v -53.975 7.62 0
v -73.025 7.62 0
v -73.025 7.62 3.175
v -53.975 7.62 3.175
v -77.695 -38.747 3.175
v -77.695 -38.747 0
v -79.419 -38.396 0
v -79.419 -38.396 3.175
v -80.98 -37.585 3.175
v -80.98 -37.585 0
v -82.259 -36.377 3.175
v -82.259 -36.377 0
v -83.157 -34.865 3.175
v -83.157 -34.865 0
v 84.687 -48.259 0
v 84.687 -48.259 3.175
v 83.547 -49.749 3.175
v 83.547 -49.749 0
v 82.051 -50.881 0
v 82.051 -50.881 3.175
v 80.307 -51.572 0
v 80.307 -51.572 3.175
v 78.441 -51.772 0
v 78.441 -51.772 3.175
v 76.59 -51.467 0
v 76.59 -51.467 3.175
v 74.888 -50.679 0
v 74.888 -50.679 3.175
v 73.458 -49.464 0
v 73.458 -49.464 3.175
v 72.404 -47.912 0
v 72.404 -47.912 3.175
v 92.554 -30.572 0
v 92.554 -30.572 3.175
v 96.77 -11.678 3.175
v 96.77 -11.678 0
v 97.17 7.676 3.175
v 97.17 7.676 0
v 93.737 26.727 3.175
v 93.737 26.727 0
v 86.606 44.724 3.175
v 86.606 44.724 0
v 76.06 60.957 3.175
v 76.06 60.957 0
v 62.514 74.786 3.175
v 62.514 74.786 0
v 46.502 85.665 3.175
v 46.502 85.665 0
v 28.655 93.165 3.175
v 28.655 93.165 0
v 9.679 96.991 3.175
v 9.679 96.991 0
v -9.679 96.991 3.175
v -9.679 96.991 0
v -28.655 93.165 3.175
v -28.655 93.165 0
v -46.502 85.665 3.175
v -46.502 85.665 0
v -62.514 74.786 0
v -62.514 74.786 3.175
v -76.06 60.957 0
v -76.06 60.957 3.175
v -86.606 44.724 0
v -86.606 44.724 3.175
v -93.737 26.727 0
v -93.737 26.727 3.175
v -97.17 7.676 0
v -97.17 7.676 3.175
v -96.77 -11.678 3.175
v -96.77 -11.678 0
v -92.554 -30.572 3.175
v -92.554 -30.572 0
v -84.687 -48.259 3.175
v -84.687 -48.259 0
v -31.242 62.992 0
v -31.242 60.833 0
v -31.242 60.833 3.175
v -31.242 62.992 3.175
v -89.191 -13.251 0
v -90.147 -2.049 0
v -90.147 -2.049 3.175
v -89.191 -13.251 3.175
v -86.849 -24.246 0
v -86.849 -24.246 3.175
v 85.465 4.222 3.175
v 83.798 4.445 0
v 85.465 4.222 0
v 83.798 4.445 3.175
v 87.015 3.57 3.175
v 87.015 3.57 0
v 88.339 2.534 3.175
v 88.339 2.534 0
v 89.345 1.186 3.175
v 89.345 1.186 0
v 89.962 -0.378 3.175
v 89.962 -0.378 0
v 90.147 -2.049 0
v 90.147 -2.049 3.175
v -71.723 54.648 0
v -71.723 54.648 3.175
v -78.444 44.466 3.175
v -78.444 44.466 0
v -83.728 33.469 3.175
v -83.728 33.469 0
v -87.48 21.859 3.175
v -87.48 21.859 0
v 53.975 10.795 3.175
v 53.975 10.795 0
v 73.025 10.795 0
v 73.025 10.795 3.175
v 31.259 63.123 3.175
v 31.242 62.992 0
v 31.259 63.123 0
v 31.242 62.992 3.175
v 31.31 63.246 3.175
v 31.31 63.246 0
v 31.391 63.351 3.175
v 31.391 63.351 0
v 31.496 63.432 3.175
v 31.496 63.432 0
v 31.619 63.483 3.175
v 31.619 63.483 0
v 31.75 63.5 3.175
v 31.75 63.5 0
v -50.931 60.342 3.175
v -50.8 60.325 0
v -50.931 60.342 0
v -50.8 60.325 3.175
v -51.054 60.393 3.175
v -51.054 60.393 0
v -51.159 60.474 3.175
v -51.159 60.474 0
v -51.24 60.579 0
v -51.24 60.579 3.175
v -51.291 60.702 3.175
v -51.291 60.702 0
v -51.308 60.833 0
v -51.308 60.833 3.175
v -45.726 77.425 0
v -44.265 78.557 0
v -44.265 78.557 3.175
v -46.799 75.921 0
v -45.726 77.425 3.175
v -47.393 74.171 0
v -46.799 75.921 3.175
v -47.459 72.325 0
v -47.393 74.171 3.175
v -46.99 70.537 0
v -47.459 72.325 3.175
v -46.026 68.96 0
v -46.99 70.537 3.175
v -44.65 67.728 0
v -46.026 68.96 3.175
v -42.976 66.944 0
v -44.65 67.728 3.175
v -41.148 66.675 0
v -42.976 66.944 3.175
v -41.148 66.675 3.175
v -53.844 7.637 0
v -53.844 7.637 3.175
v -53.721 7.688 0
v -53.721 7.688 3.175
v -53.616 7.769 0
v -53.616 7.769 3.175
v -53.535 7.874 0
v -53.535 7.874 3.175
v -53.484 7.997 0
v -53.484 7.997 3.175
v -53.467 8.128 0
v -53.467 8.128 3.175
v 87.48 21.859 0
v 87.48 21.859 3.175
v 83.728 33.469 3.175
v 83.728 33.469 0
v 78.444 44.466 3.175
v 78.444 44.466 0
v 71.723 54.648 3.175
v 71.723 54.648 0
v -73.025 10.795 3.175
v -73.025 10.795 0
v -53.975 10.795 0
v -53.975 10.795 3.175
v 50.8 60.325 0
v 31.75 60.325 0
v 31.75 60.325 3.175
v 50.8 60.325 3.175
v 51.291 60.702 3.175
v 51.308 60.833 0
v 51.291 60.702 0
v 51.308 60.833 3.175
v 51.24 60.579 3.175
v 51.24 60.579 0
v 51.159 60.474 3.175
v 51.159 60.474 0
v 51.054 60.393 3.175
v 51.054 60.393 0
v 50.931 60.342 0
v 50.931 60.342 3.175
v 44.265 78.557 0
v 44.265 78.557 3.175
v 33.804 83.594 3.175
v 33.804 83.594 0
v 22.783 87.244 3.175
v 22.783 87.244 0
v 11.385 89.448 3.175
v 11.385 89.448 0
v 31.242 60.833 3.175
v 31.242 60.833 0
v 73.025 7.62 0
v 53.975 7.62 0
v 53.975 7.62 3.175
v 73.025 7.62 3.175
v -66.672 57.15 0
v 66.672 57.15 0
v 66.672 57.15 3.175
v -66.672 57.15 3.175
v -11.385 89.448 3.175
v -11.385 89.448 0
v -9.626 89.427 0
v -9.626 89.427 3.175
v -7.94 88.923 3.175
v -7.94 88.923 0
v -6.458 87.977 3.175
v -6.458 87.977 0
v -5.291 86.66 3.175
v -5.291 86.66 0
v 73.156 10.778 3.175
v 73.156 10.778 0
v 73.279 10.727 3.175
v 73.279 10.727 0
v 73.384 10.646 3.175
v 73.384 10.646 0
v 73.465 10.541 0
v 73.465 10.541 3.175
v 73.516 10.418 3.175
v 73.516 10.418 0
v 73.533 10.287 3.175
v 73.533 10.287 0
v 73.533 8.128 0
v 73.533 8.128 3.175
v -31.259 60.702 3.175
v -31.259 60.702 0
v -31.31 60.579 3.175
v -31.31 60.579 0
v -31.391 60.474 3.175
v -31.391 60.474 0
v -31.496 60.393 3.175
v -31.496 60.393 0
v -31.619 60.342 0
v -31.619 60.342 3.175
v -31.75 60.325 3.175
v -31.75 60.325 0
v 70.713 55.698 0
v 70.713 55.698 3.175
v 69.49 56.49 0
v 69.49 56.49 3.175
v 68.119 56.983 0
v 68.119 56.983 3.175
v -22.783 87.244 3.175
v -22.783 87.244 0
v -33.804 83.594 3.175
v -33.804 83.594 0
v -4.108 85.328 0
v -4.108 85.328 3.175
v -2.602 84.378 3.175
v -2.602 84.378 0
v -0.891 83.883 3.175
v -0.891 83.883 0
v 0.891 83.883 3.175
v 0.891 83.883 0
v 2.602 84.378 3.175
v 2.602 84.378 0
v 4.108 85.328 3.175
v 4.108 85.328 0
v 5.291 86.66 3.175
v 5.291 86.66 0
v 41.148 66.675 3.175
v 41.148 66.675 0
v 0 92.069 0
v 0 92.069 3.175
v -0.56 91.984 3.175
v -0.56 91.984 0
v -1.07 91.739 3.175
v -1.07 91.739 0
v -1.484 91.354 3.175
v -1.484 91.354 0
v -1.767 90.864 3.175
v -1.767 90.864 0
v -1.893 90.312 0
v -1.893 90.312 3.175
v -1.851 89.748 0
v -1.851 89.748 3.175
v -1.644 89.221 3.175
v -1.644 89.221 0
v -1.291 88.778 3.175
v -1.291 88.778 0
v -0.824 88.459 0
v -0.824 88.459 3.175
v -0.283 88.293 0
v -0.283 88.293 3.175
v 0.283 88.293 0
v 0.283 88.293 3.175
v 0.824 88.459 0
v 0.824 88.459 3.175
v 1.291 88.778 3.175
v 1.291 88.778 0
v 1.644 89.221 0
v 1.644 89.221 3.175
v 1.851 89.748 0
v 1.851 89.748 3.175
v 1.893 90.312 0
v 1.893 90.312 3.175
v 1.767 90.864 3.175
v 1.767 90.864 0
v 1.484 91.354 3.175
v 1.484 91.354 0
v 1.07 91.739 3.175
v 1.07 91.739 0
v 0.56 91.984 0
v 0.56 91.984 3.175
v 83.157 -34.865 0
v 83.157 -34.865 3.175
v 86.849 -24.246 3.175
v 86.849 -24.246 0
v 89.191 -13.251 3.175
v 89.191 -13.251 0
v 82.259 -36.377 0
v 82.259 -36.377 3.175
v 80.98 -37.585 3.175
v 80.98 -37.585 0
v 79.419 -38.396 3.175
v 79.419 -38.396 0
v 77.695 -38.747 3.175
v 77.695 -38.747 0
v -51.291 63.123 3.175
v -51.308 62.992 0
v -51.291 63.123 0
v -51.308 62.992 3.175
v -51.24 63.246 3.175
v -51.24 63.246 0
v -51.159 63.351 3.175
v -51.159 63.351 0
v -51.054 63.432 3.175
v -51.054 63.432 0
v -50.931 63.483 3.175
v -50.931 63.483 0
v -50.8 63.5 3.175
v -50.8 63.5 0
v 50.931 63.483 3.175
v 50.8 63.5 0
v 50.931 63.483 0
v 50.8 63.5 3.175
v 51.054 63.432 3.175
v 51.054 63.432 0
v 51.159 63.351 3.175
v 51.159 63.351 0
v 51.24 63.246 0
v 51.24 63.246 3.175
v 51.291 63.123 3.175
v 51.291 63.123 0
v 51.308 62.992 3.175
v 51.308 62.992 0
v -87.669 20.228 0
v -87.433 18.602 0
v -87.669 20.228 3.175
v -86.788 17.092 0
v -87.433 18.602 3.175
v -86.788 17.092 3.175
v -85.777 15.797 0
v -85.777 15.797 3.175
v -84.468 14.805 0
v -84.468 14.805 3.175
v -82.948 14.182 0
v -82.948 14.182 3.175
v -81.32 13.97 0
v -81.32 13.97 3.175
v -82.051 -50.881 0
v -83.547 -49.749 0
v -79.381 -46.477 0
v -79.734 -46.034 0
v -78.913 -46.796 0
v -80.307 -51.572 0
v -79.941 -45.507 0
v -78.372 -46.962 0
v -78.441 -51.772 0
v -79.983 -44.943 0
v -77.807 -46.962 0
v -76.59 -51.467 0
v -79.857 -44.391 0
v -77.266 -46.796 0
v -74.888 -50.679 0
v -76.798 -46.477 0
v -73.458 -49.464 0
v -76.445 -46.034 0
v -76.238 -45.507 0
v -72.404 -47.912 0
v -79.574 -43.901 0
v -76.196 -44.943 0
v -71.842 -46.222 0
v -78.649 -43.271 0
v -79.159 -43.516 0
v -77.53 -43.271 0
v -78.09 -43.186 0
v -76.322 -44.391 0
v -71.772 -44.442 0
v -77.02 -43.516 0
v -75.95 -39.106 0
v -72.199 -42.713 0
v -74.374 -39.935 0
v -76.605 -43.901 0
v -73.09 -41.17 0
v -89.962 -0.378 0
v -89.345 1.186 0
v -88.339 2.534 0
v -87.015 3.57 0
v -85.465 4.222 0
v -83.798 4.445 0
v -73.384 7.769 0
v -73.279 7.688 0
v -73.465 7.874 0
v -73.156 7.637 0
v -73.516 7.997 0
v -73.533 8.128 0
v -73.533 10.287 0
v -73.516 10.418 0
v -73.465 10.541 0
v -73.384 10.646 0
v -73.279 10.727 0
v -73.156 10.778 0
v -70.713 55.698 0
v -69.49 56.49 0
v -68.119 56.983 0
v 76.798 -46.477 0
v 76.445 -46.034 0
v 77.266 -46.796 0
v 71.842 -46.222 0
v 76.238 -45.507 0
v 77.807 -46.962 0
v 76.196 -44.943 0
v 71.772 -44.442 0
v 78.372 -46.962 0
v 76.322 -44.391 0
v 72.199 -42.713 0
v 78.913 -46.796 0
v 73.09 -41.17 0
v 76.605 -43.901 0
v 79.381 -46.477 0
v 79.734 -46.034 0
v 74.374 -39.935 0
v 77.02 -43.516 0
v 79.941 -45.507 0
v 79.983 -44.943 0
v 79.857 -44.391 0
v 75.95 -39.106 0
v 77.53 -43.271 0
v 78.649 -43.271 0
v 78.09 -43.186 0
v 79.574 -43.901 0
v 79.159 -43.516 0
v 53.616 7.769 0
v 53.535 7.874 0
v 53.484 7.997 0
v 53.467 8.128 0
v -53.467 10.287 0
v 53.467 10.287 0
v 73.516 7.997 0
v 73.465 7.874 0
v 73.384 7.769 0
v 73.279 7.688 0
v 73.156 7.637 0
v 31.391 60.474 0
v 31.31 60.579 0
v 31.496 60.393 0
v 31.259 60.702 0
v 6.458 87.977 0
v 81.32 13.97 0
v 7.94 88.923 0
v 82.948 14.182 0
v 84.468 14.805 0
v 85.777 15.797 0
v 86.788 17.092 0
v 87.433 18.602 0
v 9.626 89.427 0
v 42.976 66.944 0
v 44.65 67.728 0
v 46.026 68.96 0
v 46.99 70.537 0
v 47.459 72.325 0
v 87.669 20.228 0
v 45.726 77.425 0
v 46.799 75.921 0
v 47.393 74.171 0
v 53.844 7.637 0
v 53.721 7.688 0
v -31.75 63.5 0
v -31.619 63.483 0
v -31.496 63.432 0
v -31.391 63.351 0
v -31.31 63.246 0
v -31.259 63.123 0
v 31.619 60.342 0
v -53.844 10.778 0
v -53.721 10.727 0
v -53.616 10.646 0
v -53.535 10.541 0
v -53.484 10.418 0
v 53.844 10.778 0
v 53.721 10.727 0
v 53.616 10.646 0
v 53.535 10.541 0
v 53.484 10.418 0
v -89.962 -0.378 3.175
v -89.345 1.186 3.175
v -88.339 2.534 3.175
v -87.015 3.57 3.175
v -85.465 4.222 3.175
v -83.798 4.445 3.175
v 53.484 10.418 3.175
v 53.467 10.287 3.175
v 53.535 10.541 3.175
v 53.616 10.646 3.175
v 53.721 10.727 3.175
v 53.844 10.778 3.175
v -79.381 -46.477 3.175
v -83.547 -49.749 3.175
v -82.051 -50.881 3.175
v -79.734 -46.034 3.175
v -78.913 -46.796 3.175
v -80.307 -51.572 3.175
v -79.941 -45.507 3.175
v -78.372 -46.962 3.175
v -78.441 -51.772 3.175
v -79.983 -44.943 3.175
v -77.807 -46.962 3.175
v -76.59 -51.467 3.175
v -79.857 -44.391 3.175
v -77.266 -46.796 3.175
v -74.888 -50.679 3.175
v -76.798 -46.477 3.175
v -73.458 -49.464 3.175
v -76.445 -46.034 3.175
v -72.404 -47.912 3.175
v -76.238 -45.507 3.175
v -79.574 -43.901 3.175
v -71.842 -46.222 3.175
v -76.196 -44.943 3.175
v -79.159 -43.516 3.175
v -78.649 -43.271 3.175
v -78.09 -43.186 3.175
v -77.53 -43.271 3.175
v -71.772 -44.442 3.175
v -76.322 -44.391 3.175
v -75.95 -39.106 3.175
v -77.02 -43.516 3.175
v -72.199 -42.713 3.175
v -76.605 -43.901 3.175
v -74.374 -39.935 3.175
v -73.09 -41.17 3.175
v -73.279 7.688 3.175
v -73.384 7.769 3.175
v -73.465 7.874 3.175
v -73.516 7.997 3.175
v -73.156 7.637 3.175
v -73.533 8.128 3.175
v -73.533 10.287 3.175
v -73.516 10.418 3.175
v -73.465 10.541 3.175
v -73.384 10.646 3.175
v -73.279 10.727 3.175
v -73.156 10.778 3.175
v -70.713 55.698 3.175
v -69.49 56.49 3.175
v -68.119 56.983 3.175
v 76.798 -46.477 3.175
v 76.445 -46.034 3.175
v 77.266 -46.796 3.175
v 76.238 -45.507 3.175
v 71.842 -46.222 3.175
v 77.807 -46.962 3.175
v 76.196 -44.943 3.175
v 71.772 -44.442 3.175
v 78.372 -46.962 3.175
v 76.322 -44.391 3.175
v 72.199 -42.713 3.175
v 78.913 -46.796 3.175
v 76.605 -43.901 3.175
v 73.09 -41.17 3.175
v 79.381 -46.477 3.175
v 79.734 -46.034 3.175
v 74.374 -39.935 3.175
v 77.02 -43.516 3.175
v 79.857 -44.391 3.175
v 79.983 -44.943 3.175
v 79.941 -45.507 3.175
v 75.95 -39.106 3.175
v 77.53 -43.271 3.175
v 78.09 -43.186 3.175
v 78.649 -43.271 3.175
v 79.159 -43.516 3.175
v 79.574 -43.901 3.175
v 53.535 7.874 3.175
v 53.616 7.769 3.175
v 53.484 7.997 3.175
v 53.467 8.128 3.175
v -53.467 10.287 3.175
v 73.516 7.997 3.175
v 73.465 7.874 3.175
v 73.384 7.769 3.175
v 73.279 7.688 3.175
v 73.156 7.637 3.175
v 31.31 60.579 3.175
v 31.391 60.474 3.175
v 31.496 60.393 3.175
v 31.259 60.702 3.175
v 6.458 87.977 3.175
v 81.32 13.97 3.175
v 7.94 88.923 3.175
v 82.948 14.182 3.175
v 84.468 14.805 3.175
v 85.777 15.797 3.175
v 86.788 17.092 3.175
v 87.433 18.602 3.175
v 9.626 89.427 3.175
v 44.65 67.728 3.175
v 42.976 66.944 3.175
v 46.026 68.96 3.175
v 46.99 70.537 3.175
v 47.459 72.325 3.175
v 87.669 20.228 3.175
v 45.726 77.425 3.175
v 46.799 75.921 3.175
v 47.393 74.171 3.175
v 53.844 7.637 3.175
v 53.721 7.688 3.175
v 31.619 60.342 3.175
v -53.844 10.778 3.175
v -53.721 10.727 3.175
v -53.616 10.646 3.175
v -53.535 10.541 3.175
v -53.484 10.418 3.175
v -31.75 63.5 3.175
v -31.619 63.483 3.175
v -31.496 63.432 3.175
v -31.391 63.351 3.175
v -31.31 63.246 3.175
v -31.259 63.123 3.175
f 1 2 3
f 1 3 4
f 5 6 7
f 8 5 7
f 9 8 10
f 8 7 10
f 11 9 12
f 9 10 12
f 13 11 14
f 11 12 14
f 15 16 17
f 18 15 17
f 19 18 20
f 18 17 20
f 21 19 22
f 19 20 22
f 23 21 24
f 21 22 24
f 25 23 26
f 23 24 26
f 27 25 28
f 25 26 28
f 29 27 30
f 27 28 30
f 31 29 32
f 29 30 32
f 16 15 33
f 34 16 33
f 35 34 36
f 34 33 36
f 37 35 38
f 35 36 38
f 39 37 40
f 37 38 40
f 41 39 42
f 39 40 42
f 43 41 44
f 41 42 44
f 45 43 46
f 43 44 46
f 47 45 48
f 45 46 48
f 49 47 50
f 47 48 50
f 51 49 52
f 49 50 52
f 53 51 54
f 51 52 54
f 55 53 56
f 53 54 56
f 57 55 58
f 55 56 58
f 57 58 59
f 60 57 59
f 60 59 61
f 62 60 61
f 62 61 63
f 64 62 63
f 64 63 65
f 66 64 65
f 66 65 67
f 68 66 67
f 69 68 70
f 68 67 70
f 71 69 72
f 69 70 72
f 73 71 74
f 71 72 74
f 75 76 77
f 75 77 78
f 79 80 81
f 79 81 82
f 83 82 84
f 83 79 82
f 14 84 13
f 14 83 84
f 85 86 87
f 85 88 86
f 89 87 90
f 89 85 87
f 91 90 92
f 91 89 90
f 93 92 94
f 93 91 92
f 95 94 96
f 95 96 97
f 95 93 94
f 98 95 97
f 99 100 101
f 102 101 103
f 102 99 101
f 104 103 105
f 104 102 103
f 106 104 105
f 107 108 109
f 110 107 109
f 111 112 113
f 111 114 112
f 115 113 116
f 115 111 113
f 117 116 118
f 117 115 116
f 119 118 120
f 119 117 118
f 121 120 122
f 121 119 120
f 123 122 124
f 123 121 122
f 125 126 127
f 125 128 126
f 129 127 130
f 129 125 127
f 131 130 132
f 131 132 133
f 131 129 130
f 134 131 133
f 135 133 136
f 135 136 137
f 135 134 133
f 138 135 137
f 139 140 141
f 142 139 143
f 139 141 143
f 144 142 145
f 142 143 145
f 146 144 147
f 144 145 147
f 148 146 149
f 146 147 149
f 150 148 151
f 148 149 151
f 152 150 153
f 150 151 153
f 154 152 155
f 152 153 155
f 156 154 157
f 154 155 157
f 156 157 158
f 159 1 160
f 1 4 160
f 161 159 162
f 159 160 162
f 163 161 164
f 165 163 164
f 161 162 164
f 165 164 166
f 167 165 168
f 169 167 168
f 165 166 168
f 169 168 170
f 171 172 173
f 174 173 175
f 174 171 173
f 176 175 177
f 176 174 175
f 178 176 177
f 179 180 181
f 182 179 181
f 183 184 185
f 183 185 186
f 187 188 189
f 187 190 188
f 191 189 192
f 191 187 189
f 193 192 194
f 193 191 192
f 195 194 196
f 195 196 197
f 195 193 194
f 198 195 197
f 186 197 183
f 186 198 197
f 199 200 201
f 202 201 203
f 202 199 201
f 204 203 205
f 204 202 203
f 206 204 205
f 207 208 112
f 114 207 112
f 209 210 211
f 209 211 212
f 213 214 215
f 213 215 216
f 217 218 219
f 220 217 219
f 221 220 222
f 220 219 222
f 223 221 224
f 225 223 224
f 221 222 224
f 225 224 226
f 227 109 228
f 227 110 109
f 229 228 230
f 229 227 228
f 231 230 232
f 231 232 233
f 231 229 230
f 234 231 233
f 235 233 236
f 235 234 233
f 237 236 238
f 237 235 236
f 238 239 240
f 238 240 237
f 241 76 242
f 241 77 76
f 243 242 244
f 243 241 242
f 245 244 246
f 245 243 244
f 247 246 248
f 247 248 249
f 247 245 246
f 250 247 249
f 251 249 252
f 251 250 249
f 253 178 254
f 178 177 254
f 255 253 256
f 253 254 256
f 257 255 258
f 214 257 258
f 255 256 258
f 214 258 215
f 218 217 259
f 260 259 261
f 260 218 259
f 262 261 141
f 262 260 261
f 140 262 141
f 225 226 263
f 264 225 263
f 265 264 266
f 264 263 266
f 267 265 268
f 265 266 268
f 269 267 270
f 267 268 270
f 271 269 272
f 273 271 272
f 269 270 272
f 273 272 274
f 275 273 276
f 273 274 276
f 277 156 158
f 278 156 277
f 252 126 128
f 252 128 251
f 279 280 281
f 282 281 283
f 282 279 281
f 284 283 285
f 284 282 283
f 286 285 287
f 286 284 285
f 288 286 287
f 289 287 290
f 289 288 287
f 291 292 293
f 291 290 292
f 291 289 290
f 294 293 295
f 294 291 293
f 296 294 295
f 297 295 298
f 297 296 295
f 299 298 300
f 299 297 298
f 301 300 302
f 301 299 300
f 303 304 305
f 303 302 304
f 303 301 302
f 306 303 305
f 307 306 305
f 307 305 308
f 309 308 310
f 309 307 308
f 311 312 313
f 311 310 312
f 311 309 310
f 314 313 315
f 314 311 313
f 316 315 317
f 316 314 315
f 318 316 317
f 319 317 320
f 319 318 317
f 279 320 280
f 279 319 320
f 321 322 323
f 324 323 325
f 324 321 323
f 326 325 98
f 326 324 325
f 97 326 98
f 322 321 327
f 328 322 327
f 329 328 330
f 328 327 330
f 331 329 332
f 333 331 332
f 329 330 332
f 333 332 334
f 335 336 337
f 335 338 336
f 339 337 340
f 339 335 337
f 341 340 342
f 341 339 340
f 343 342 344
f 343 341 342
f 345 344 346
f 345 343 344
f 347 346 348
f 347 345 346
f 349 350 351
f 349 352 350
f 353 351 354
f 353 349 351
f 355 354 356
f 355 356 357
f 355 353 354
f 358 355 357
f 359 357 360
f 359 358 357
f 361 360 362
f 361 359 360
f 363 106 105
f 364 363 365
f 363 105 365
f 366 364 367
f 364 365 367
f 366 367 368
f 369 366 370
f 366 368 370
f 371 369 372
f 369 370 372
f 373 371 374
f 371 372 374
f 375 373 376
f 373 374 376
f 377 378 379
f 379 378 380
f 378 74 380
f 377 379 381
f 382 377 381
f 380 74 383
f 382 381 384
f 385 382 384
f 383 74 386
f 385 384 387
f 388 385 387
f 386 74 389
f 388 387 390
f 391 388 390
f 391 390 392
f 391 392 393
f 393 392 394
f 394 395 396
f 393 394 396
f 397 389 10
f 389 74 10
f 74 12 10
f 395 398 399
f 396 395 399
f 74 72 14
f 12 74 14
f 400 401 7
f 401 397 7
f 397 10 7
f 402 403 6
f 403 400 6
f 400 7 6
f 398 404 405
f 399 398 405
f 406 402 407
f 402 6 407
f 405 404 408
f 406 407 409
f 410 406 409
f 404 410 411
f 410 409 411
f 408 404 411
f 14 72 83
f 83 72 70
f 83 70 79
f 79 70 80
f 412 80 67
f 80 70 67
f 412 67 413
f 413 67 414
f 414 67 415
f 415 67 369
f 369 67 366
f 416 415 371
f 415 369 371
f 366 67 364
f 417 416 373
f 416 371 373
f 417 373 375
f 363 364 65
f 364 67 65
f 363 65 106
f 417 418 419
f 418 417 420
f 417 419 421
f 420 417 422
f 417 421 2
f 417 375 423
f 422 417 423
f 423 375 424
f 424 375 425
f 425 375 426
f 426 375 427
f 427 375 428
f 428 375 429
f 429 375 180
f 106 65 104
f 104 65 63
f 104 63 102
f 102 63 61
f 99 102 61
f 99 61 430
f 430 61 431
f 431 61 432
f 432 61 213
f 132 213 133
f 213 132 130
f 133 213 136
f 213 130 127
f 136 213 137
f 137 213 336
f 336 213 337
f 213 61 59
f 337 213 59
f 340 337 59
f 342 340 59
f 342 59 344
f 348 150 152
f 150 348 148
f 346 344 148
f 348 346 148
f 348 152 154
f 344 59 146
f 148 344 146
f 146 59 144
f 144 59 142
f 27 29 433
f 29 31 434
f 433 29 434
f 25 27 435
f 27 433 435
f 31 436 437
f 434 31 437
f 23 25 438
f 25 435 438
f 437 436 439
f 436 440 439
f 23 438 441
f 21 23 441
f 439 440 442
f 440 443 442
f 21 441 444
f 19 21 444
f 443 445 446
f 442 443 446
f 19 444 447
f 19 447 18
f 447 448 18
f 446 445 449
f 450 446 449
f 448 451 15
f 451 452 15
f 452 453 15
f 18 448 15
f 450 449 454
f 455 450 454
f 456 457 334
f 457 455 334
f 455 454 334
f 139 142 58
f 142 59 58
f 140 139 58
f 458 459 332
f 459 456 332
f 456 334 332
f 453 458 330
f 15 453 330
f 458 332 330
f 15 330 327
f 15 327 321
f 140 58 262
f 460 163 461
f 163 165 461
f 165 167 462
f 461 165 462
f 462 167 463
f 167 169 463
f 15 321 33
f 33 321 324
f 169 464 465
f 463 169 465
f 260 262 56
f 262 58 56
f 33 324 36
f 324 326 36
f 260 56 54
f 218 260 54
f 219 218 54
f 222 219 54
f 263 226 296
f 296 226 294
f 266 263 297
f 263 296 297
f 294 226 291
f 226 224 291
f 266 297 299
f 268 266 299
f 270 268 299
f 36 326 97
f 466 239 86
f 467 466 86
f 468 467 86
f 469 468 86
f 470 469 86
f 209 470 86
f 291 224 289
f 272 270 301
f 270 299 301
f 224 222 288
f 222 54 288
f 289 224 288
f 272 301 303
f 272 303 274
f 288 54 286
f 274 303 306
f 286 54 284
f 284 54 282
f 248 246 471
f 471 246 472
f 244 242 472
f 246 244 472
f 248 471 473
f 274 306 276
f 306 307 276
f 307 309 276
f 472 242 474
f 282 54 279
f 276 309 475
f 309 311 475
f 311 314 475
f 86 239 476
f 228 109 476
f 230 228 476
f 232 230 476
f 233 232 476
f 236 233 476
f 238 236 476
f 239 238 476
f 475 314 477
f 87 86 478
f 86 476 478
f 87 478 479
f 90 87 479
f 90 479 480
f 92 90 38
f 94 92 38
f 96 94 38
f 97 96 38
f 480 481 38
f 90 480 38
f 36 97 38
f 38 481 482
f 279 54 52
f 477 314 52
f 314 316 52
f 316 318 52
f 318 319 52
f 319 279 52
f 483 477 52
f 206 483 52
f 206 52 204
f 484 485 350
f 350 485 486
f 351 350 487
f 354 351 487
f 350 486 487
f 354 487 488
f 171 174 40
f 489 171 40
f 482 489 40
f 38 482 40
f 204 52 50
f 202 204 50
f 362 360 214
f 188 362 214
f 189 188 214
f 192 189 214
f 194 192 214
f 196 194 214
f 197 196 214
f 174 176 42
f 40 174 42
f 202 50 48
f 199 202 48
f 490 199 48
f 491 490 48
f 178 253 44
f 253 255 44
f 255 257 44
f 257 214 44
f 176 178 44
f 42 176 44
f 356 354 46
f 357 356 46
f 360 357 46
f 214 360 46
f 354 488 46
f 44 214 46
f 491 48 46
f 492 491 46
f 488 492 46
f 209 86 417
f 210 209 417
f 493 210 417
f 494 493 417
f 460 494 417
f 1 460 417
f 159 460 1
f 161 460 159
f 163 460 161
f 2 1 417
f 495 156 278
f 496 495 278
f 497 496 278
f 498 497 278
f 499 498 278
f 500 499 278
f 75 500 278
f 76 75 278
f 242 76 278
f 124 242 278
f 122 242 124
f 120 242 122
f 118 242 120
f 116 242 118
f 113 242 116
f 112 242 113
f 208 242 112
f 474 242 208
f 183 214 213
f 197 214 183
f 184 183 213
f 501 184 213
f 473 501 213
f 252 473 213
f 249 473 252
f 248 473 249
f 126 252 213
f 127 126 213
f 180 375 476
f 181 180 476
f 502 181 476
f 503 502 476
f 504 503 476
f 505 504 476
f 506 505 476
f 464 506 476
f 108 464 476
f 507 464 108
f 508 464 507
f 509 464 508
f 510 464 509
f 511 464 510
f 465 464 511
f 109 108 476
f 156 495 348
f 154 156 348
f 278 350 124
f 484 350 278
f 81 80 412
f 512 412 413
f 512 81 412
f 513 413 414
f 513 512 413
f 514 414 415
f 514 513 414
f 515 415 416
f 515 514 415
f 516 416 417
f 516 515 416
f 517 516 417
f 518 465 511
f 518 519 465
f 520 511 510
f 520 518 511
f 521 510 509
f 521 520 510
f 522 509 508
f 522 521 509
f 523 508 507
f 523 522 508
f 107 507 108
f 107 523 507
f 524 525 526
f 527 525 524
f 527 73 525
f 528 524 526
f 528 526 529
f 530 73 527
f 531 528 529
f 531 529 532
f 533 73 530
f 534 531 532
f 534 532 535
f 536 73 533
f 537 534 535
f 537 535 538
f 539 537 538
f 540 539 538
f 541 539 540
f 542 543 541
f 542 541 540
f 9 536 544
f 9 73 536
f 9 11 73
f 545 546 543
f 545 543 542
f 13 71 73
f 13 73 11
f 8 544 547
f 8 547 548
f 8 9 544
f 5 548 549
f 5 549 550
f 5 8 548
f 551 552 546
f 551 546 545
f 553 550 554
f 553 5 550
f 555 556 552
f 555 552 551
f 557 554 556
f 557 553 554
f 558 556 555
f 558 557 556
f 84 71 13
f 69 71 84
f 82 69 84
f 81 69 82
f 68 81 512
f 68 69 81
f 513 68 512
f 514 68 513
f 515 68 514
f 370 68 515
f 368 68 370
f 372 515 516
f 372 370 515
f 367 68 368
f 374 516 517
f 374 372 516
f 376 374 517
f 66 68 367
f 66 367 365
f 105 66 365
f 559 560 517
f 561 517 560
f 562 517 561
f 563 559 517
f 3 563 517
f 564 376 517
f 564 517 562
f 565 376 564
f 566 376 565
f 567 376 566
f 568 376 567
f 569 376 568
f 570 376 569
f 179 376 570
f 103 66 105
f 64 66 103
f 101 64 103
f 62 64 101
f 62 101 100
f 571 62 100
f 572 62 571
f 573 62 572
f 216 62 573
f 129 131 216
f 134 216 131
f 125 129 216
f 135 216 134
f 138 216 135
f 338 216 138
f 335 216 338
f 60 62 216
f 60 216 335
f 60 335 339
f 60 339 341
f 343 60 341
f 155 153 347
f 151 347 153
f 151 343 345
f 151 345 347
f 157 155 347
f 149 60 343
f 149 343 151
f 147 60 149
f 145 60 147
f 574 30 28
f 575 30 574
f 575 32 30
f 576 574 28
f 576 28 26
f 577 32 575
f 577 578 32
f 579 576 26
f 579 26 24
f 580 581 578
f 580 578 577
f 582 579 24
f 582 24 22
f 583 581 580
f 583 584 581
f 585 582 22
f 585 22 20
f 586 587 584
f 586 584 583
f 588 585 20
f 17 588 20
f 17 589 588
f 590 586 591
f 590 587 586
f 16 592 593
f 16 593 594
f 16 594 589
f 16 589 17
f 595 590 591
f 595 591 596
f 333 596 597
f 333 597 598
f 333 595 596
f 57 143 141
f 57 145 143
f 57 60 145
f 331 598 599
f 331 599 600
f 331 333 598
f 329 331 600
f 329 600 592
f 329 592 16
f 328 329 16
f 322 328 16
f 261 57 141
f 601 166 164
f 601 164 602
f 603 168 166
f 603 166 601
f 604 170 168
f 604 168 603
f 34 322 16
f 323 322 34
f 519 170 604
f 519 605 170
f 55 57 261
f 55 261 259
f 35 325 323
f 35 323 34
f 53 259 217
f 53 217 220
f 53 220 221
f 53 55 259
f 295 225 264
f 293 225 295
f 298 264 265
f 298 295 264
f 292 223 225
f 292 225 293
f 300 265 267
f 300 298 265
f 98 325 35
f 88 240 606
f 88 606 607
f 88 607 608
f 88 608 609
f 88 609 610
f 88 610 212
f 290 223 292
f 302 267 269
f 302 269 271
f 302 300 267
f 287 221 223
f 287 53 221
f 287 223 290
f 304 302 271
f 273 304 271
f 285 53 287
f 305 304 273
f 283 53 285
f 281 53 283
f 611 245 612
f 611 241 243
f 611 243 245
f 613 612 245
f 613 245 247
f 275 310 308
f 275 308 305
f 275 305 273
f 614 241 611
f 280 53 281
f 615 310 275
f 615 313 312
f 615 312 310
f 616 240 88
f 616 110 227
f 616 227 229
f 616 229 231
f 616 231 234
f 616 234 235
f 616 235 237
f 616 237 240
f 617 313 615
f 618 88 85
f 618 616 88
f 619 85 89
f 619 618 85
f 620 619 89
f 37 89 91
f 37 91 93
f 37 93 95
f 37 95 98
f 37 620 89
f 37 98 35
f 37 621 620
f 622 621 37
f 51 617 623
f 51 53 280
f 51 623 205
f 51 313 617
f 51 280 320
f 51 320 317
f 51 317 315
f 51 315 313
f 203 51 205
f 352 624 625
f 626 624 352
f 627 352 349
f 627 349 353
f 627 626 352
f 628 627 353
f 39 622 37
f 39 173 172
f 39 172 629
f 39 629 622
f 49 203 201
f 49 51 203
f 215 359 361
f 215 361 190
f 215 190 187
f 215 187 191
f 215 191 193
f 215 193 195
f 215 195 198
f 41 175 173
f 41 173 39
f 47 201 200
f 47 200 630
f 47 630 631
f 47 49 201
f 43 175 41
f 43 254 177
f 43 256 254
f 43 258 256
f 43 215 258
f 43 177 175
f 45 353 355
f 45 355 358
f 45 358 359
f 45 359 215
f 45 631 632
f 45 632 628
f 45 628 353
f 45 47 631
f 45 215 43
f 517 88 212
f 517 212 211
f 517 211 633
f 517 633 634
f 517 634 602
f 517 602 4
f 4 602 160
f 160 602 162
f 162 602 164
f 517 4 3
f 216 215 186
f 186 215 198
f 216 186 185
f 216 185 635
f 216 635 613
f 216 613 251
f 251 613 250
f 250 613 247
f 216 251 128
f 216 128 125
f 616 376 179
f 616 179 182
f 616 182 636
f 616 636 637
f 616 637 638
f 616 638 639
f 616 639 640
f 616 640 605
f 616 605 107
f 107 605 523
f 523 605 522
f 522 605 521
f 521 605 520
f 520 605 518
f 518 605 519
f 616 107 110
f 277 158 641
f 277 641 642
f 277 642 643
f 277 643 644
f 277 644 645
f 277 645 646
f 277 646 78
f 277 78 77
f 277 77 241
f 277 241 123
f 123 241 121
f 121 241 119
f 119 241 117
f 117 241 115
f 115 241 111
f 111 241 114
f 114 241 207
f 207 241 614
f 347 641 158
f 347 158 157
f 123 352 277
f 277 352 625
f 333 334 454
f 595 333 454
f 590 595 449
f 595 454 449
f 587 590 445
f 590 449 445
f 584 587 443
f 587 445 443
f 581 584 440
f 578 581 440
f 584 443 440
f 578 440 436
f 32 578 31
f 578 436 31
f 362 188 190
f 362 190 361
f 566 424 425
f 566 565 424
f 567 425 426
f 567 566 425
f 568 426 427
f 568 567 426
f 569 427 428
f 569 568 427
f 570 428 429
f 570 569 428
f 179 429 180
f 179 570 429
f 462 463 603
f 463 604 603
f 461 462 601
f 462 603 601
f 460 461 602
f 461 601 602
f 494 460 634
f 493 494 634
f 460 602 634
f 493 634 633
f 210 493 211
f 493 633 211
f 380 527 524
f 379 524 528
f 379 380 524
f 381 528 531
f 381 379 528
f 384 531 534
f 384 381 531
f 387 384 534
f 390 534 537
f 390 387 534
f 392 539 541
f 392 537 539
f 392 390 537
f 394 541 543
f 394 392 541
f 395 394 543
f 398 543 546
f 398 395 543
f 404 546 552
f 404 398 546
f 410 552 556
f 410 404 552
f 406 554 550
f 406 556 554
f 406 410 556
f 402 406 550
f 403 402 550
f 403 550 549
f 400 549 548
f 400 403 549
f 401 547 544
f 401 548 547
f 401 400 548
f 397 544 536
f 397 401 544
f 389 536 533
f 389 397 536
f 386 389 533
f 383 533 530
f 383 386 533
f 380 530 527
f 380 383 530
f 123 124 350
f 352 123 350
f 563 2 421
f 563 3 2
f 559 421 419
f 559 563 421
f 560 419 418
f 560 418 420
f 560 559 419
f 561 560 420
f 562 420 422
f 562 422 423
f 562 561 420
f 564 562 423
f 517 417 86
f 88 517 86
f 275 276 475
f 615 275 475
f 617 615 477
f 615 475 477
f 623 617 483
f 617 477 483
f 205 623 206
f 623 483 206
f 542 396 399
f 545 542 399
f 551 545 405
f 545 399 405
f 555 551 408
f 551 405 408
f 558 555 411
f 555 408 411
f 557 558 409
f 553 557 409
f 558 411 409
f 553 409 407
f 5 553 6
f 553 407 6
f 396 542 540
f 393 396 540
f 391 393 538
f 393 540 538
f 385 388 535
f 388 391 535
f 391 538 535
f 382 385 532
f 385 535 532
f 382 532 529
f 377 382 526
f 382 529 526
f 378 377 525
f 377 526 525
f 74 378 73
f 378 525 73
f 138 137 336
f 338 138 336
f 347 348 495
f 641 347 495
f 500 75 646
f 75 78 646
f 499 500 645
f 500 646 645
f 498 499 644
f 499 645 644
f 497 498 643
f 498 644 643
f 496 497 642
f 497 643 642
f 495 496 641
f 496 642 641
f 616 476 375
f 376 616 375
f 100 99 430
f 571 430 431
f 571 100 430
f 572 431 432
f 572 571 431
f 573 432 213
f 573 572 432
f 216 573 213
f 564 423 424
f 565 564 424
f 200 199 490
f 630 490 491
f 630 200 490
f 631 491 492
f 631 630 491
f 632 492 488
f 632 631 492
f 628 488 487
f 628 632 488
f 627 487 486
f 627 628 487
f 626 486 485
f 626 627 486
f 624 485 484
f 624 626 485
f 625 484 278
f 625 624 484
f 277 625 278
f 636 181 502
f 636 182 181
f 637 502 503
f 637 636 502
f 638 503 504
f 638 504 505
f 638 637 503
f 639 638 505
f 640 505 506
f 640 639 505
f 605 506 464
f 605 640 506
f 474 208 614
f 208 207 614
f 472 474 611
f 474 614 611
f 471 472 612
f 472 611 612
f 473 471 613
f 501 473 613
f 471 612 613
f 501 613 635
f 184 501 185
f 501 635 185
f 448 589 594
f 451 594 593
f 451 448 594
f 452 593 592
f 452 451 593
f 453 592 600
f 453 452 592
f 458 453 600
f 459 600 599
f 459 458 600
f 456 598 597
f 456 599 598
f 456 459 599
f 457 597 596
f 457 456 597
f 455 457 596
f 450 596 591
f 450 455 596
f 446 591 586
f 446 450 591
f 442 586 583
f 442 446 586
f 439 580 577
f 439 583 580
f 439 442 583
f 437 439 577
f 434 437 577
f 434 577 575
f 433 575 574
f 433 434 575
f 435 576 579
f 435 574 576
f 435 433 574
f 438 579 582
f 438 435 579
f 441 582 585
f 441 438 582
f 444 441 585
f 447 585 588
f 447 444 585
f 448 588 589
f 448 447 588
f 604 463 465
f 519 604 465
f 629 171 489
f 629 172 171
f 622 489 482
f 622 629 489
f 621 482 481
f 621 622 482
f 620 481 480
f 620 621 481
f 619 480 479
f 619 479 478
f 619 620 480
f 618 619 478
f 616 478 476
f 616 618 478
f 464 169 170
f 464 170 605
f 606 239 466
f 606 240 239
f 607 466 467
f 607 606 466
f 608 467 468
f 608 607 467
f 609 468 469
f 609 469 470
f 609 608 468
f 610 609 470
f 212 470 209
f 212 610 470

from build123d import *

# Parameters (mm, degrees)
SKETCH1_R           = 97.4725
SKETCH1_R_2         = 90.17
BOSS_EXTRUDE1_DEPTH = 3.175
BOSS_EXTRUDE2_START = -3.175
BOSS_EXTRUDE2_DEPTH = 3.175
CIRPATTERN2_COUNT   = 3
CUT_EXTRUDE1_DEPTH  = 138.883491171
BOSS_EXTRUDE5_START = -3.175
SKETCH13_W          = 20.066
SKETCH13_H          = 3.175
BOSS_EXTRUDE5_DEPTH = 3.175
BOSS_EXTRUDE6_START = -3.175
SKETCH17_W          = 20.066
SKETCH17_H          = 3.175
BOSS_EXTRUDE6_DEPTH = 3.175
FILLET1_R           = 6.35
FILLET2_R           = 0.508


with BuildPart() as part:
    # Sketch1 → Boss-Extrude1 (new body)
    with BuildSketch(Plane.XY):
        Circle(SKETCH1_R)
        Circle(SKETCH1_R_2, mode=Mode.SUBTRACT)
    extrude(amount=BOSS_EXTRUDE1_DEPTH)

    # Sketch2 → Boss-Extrude2 (add)
    with BuildSketch(Plane.XY.offset(3.175).offset(BOSS_EXTRUDE2_START)):
        with BuildLine():
            ThreePointArc((-5.291472464, 86.659612676), (0, 83.82), (5.291472464, 86.659612676))
            ThreePointArc((5.291472464, 86.659612676), (7.940261692, 88.923194985), (11.38468318, 89.448409091))
            ThreePointArc((11.38468318, 89.448409091), (0, 90.17), (-11.38468318, 89.448409091))
            ThreePointArc((-11.38468318, 89.448409091), (-7.940261692, 88.923194985), (-5.291472464, 86.659612676))
        make_face()
    boss_extrude2 = extrude(amount=BOSS_EXTRUDE2_DEPTH)

    # Sketch7 → #6 Clearance Hole2 (revolve, cut)
    with BuildSketch(Plane(origin=(0, 90.17, 0), x_dir=(0, 1, 0), z_dir=(1, 0, 0))):
        Polygon((0, 0), (0, 7.490824014), (1.89865, 6.35), (1.89865, 0), align=None)
    f_6_clearance_hole2 = revolve(axis=Axis((0, 90.17, -6.35), (0, 0, 1)), mode=Mode.SUBTRACT)

    # CirPattern2: Boss-Extrude2, #6 Clearance Hole2 ×3 about axis
    cirpattern2_axis = Axis((0, 0, 0), (0, 0, 1))
    add([boss_extrude2.rotate(cirpattern2_axis, i * 360 / CIRPATTERN2_COUNT) for i in range(1, CIRPATTERN2_COUNT)])
    add([f_6_clearance_hole2.rotate(cirpattern2_axis, i * 360 / CIRPATTERN2_COUNT) for i in range(1, CIRPATTERN2_COUNT)], mode=Mode.SUBTRACT)

    # Sketch14 → Cut-Extrude1 (cut, through all)
    with BuildSketch(Plane.XY.offset(3.175)):
        with BuildLine():
            ThreePointArc((-72.403689828, -47.912355915), (-78.441248685, -51.771990171), (-84.687137855, -48.259475113))
            ThreePointArc((-84.687137855, -48.259475113), (6.18e-07, -97.4725), (84.687138467, -48.25947404))
            ThreePointArc((84.687138467, -48.25947404), (78.441249322, -51.771989501), (72.403689828, -47.912355915))
            ThreePointArc((72.403689828, -47.912355915), (73.039614996, -51.33806583), (71.772253011, -54.583629393))
            ThreePointArc((71.772253011, -54.583629393), (0, -90.17), (-71.772253011, -54.583629393))
            ThreePointArc((-71.772253011, -54.583629393), (-73.039614996, -51.33806583), (-72.403689828, -47.912355915))
        make_face()
    extrude(amount=-CUT_EXTRUDE1_DEPTH, mode=Mode.SUBTRACT)

    # Sketch13 → Boss-Extrude5 (add)
    with BuildSketch(Plane.XY.offset(3.175).offset(BOSS_EXTRUDE5_START)):
        with BuildLine():
            Line((-90.0603735, 4.445), (90.0603735, 4.445))
            ThreePointArc((90.0603735, 4.445), (89.697330897, 9.220505951), (89.081243817, 13.97))
            Line((89.081243817, 13.97), (-89.081243817, 13.97))
            ThreePointArc((-89.081243817, 13.97), (-89.697330897, 9.220505951), (-90.0603735, 4.445))
        make_face()
        with Locations((-63.5, 9.2075)):
            Rectangle(SKETCH13_W, SKETCH13_H, mode=Mode.SUBTRACT)
        with Locations((63.5, 9.2075)):
            Rectangle(SKETCH13_W, SKETCH13_H, mode=Mode.SUBTRACT)
    extrude(amount=BOSS_EXTRUDE5_DEPTH)

    # Sketch17 → Boss-Extrude6 (add)
    with BuildSketch(Plane.XY.offset(3.175).offset(BOSS_EXTRUDE6_START)):
        with BuildLine():
            Line((-60.704804382, 66.675), (60.704804382, 66.675))
            ThreePointArc((60.704804382, 66.675), (65.399047227, 62.0773189), (69.746013506, 57.15))
            Line((69.746013506, 57.15), (-69.746013506, 57.15))
            ThreePointArc((-69.746013506, 57.15), (-65.399047227, 62.0773189), (-60.704804382, 66.675))
        make_face()
        with Locations((-41.275, 61.9125)):
            Rectangle(SKETCH17_W, SKETCH17_H, mode=Mode.SUBTRACT)
        with Locations((41.275, 61.9125)):
            Rectangle(SKETCH17_W, SKETCH17_H, mode=Mode.SUBTRACT)
    extrude(amount=BOSS_EXTRUDE6_DEPTH)

    # Fillet1
    fillet1_edges = [part.edges().sort_by_distance(p)[0] for p in [
        (69.746013506, 57.15, 1.5875),
        (60.704804382, 66.675, 1.5875),
        (-60.704804382, 66.675, 1.5875),
        (-69.746013506, 57.15, 1.5875),
        (90.0603735, 4.445, 1.5875),
        (89.081243817, 13.97, 1.5875),
        (-89.081243817, 13.97, 1.5875),
        (-90.0603735, 4.445, 1.5875),
    ]]
    fillet(fillet1_edges, radius=FILLET1_R)

    # Fillet2
    fillet2_edges = [part.edges().sort_by_distance(p)[0] for p in [
        (-51.308, 60.325, 1.5875),
        (-31.242, 60.325, 1.5875),
        (-31.242, 63.5, 1.5875),
        (-51.308, 63.5, 1.5875),
        (31.242, 60.325, 1.5875),
        (51.308, 60.325, 1.5875),
        (51.308, 63.5, 1.5875),
        (31.242, 63.5, 1.5875),
        (-73.533, 7.62, 1.5875),
        (-53.467, 7.62, 1.5875),
        (-53.467, 10.795, 1.5875),
        (-73.533, 10.795, 1.5875),
        (53.467, 7.62, 1.5875),
        (73.533, 7.62, 1.5875),
        (73.533, 10.795, 1.5875),
        (53.467, 10.795, 1.5875),
    ]]
    fillet(fillet2_edges, radius=FILLET2_R)


solid = part.part
